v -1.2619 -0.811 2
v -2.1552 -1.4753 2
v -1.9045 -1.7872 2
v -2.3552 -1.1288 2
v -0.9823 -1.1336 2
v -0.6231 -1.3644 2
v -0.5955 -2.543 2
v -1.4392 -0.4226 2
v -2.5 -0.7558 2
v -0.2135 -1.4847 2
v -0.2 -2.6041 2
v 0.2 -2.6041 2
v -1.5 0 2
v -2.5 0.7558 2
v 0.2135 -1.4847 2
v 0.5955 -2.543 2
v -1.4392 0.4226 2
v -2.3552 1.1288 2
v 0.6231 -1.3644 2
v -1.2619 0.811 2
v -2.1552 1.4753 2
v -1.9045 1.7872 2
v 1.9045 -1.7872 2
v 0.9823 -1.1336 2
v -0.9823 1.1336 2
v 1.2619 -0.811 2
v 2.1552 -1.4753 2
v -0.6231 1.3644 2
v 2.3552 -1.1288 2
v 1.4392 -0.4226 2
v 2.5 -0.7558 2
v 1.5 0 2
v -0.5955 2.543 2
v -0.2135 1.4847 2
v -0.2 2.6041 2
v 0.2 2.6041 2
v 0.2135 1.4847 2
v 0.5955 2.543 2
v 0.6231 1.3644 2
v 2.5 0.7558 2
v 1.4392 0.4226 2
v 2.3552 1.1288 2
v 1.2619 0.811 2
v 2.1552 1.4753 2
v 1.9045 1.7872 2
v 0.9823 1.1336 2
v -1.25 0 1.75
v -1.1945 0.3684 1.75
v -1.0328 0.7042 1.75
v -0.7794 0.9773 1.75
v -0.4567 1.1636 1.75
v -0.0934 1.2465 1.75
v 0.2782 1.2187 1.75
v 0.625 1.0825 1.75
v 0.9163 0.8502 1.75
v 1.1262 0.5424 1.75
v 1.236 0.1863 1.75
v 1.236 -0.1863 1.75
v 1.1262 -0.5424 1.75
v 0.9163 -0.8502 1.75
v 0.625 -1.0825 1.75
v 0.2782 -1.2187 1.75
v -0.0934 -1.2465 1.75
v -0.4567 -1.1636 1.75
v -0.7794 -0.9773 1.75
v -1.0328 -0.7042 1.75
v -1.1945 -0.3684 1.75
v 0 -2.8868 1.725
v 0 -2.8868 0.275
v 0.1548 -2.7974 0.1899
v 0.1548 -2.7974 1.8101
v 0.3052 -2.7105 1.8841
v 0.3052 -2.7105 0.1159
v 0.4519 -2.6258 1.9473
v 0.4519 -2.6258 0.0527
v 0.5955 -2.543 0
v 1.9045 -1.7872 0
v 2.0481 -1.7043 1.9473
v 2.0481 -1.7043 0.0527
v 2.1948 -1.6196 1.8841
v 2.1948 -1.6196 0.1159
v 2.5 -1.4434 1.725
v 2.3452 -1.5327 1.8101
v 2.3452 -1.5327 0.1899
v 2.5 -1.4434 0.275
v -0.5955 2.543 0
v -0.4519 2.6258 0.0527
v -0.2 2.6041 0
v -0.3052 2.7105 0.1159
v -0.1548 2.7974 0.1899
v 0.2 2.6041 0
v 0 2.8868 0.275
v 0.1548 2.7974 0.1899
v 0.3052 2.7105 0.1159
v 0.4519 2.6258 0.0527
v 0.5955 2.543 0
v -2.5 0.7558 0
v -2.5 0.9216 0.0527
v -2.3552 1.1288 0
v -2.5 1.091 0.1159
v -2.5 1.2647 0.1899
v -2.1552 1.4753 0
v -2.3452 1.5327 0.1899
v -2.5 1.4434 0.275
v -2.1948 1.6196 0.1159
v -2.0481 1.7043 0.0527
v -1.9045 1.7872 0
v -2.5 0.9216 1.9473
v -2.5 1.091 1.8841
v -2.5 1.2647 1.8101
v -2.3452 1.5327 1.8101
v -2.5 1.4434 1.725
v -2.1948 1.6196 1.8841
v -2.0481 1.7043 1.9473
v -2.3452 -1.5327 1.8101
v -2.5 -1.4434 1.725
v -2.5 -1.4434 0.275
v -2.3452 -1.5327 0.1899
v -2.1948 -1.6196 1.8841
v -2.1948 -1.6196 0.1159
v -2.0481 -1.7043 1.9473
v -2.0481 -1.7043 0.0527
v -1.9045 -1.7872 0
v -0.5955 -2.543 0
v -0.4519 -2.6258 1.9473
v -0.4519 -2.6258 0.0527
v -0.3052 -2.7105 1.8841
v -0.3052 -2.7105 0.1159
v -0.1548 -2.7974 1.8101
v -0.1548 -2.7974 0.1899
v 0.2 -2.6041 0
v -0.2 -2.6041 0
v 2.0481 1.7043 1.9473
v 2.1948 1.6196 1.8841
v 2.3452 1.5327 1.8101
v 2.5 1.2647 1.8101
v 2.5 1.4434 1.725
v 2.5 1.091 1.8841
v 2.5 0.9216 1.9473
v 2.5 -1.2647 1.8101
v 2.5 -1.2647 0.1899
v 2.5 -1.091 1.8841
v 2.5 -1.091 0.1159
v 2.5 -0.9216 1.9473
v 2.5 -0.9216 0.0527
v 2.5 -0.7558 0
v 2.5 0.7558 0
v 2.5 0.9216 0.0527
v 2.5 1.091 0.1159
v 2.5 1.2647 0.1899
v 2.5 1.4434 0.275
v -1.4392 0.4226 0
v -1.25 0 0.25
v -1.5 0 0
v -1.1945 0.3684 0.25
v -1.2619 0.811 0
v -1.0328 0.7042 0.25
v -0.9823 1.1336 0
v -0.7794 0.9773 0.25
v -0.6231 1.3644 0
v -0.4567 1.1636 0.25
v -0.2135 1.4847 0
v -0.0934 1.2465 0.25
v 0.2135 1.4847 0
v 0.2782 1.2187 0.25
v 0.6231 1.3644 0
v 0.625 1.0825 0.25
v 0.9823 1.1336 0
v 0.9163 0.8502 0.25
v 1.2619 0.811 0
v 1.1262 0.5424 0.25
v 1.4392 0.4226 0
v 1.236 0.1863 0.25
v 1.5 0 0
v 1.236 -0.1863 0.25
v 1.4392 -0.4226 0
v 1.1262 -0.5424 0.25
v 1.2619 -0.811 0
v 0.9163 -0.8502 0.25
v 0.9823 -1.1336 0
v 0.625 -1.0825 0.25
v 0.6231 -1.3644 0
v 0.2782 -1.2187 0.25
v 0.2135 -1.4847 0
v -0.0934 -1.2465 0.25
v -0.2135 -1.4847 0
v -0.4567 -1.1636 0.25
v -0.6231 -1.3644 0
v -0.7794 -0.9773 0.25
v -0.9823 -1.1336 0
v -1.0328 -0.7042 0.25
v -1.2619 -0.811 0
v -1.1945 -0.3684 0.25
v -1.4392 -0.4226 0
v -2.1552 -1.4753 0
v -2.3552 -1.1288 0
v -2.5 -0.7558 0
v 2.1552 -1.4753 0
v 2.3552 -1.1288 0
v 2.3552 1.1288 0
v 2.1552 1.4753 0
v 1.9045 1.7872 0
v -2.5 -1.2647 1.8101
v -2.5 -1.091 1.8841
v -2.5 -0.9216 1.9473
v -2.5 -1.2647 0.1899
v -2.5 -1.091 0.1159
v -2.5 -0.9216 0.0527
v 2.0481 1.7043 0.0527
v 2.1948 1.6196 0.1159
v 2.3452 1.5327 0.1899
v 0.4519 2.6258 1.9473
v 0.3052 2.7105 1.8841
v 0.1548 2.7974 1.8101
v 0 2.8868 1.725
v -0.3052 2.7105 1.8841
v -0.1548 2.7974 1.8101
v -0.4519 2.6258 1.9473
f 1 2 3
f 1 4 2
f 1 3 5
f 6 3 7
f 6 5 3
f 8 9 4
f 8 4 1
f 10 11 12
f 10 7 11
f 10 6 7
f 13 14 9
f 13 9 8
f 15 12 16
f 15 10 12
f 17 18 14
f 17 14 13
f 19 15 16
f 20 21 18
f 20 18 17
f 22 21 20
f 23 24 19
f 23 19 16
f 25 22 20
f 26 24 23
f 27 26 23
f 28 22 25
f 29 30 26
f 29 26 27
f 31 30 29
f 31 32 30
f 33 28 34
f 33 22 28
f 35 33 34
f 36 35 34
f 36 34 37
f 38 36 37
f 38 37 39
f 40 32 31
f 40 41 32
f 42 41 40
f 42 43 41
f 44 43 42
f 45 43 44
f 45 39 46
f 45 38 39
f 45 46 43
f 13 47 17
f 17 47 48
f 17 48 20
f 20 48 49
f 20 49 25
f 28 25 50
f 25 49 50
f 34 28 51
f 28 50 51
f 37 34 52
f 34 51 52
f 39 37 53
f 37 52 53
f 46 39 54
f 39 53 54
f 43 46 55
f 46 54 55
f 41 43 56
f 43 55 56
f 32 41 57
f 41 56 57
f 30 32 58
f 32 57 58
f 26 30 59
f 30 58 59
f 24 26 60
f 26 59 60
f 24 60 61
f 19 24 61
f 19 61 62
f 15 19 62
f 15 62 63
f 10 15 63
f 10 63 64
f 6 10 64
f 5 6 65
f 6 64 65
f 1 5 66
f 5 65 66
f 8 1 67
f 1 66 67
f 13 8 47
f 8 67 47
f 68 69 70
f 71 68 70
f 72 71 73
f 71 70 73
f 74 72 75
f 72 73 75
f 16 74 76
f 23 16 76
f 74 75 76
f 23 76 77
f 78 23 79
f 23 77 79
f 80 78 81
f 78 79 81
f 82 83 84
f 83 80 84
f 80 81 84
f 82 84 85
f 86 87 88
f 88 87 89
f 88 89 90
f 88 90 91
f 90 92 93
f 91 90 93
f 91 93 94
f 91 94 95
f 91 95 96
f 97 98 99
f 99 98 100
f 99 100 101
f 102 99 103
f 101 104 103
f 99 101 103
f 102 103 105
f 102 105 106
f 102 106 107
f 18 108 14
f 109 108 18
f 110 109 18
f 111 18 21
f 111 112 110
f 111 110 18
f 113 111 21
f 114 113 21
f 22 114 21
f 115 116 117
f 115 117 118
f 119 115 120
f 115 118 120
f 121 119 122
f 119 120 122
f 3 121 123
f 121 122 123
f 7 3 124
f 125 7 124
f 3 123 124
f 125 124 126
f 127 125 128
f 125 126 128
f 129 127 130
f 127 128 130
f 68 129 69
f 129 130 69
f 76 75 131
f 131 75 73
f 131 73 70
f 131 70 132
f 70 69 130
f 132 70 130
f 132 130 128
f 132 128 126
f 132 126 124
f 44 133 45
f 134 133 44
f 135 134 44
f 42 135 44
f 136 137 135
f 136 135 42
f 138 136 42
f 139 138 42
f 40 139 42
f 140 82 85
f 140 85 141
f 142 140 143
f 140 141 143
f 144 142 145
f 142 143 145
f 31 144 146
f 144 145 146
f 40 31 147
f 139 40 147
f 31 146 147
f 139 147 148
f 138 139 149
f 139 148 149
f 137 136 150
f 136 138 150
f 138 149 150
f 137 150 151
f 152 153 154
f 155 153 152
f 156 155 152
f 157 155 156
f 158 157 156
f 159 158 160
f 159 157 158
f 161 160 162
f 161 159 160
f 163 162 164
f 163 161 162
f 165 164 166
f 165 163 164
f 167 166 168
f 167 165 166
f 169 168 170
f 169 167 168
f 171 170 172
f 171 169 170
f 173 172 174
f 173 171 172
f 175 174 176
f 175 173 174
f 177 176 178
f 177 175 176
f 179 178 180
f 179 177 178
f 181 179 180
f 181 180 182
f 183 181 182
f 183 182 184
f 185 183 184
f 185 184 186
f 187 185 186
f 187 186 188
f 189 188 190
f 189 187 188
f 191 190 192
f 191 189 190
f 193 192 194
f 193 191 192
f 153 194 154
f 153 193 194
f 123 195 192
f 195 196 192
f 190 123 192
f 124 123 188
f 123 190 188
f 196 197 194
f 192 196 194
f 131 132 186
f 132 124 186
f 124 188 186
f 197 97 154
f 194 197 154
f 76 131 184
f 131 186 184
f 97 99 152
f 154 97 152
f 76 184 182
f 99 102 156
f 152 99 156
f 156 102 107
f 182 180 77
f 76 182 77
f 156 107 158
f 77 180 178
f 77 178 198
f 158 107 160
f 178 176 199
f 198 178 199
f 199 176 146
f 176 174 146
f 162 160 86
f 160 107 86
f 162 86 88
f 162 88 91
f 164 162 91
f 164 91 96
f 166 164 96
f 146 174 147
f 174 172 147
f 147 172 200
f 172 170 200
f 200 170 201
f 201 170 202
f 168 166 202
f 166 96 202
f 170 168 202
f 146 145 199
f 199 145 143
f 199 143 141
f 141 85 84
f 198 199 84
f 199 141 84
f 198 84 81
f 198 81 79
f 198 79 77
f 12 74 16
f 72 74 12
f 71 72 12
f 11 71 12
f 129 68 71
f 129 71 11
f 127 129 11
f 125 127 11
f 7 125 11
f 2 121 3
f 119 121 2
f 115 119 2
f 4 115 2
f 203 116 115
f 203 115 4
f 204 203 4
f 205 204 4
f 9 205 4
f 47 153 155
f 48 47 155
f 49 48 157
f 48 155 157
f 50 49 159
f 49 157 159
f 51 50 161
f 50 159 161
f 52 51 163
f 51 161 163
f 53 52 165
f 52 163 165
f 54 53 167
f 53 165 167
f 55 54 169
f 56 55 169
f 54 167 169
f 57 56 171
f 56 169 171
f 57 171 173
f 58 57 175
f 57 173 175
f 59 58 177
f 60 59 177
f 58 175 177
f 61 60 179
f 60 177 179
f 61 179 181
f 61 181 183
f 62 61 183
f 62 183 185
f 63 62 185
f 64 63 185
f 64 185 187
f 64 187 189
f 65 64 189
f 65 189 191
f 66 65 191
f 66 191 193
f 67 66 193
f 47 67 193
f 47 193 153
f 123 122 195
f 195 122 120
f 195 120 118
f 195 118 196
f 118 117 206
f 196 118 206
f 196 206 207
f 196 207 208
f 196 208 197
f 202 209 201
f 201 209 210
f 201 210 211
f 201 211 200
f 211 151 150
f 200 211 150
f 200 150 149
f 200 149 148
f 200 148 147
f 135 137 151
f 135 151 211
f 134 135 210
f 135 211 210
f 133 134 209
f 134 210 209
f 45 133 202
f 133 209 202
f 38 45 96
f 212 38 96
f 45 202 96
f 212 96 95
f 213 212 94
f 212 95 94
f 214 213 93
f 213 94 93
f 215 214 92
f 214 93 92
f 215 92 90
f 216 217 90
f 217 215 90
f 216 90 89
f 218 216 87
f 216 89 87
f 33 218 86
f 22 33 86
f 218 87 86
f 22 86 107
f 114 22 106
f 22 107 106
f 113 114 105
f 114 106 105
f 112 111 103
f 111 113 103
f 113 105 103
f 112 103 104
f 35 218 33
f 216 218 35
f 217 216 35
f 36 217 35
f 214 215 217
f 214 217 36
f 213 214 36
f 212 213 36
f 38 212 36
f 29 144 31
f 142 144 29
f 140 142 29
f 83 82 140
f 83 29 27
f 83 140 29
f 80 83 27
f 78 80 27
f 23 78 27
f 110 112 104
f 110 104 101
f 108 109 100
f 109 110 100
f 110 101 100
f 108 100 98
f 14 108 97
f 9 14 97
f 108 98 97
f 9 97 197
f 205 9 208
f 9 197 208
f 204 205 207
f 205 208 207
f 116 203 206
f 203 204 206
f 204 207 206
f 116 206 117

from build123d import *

# Parameters (mm, degrees)
EXTRUDE_1_DEPTH     = 2
SKETCH_2_R          = 1.25
CUT_EXTRUDE_1_DEPTH = 5.310839052
CHAMFER_1_SIZE      = 0.25


with BuildPart() as part:
    # Эскиз1 → Вытянуть1 (new body)
    with BuildSketch(Plane.XY):
        Polygon((0, 2.886751346), (-2.5, 1.443375673), (-2.5, -1.443375673), (0, -2.886751346), (2.5, -1.443375673), (2.5, 1.443375673), align=None)
    extrude(amount=EXTRUDE_1_DEPTH)

    # Эскиз15 → Вырез-Повернуть1 (revolve, cut)
    with BuildSketch(Plane(origin=(0, 0, 0), x_dir=(0, 0, -1), z_dir=(1, 0, 0))):
        Polygon((-2, 2.886751346), (-2, 2.611751346), (-1.725, 2.886751346), align=None)
        Polygon((-0.275, 2.886751346), (0, 2.886751346), (0, 2.611751346), align=None)
    revolve(axis=Axis((0, 0, 2.633835381), (0, 0, -1)), mode=Mode.SUBTRACT)

    # Эскиз2 → Вырез-Вытянуть1 (cut, through all)
    with BuildSketch(Plane(origin=(0, 0, 0), x_dir=(-1, 0, 0), z_dir=(0, 0, -1))):
        Circle(SKETCH_2_R)
    extrude(amount=-CUT_EXTRUDE_1_DEPTH, mode=Mode.SUBTRACT)

    # Фаска1
    chamfer_1_edges = [part.edges().sort_by_distance(p)[0] for p in [
        (1.25, 0, 2),
        (1.25, 0, 0),
    ]]
    chamfer(chamfer_1_edges, length=CHAMFER_1_SIZE)


solid = part.part
